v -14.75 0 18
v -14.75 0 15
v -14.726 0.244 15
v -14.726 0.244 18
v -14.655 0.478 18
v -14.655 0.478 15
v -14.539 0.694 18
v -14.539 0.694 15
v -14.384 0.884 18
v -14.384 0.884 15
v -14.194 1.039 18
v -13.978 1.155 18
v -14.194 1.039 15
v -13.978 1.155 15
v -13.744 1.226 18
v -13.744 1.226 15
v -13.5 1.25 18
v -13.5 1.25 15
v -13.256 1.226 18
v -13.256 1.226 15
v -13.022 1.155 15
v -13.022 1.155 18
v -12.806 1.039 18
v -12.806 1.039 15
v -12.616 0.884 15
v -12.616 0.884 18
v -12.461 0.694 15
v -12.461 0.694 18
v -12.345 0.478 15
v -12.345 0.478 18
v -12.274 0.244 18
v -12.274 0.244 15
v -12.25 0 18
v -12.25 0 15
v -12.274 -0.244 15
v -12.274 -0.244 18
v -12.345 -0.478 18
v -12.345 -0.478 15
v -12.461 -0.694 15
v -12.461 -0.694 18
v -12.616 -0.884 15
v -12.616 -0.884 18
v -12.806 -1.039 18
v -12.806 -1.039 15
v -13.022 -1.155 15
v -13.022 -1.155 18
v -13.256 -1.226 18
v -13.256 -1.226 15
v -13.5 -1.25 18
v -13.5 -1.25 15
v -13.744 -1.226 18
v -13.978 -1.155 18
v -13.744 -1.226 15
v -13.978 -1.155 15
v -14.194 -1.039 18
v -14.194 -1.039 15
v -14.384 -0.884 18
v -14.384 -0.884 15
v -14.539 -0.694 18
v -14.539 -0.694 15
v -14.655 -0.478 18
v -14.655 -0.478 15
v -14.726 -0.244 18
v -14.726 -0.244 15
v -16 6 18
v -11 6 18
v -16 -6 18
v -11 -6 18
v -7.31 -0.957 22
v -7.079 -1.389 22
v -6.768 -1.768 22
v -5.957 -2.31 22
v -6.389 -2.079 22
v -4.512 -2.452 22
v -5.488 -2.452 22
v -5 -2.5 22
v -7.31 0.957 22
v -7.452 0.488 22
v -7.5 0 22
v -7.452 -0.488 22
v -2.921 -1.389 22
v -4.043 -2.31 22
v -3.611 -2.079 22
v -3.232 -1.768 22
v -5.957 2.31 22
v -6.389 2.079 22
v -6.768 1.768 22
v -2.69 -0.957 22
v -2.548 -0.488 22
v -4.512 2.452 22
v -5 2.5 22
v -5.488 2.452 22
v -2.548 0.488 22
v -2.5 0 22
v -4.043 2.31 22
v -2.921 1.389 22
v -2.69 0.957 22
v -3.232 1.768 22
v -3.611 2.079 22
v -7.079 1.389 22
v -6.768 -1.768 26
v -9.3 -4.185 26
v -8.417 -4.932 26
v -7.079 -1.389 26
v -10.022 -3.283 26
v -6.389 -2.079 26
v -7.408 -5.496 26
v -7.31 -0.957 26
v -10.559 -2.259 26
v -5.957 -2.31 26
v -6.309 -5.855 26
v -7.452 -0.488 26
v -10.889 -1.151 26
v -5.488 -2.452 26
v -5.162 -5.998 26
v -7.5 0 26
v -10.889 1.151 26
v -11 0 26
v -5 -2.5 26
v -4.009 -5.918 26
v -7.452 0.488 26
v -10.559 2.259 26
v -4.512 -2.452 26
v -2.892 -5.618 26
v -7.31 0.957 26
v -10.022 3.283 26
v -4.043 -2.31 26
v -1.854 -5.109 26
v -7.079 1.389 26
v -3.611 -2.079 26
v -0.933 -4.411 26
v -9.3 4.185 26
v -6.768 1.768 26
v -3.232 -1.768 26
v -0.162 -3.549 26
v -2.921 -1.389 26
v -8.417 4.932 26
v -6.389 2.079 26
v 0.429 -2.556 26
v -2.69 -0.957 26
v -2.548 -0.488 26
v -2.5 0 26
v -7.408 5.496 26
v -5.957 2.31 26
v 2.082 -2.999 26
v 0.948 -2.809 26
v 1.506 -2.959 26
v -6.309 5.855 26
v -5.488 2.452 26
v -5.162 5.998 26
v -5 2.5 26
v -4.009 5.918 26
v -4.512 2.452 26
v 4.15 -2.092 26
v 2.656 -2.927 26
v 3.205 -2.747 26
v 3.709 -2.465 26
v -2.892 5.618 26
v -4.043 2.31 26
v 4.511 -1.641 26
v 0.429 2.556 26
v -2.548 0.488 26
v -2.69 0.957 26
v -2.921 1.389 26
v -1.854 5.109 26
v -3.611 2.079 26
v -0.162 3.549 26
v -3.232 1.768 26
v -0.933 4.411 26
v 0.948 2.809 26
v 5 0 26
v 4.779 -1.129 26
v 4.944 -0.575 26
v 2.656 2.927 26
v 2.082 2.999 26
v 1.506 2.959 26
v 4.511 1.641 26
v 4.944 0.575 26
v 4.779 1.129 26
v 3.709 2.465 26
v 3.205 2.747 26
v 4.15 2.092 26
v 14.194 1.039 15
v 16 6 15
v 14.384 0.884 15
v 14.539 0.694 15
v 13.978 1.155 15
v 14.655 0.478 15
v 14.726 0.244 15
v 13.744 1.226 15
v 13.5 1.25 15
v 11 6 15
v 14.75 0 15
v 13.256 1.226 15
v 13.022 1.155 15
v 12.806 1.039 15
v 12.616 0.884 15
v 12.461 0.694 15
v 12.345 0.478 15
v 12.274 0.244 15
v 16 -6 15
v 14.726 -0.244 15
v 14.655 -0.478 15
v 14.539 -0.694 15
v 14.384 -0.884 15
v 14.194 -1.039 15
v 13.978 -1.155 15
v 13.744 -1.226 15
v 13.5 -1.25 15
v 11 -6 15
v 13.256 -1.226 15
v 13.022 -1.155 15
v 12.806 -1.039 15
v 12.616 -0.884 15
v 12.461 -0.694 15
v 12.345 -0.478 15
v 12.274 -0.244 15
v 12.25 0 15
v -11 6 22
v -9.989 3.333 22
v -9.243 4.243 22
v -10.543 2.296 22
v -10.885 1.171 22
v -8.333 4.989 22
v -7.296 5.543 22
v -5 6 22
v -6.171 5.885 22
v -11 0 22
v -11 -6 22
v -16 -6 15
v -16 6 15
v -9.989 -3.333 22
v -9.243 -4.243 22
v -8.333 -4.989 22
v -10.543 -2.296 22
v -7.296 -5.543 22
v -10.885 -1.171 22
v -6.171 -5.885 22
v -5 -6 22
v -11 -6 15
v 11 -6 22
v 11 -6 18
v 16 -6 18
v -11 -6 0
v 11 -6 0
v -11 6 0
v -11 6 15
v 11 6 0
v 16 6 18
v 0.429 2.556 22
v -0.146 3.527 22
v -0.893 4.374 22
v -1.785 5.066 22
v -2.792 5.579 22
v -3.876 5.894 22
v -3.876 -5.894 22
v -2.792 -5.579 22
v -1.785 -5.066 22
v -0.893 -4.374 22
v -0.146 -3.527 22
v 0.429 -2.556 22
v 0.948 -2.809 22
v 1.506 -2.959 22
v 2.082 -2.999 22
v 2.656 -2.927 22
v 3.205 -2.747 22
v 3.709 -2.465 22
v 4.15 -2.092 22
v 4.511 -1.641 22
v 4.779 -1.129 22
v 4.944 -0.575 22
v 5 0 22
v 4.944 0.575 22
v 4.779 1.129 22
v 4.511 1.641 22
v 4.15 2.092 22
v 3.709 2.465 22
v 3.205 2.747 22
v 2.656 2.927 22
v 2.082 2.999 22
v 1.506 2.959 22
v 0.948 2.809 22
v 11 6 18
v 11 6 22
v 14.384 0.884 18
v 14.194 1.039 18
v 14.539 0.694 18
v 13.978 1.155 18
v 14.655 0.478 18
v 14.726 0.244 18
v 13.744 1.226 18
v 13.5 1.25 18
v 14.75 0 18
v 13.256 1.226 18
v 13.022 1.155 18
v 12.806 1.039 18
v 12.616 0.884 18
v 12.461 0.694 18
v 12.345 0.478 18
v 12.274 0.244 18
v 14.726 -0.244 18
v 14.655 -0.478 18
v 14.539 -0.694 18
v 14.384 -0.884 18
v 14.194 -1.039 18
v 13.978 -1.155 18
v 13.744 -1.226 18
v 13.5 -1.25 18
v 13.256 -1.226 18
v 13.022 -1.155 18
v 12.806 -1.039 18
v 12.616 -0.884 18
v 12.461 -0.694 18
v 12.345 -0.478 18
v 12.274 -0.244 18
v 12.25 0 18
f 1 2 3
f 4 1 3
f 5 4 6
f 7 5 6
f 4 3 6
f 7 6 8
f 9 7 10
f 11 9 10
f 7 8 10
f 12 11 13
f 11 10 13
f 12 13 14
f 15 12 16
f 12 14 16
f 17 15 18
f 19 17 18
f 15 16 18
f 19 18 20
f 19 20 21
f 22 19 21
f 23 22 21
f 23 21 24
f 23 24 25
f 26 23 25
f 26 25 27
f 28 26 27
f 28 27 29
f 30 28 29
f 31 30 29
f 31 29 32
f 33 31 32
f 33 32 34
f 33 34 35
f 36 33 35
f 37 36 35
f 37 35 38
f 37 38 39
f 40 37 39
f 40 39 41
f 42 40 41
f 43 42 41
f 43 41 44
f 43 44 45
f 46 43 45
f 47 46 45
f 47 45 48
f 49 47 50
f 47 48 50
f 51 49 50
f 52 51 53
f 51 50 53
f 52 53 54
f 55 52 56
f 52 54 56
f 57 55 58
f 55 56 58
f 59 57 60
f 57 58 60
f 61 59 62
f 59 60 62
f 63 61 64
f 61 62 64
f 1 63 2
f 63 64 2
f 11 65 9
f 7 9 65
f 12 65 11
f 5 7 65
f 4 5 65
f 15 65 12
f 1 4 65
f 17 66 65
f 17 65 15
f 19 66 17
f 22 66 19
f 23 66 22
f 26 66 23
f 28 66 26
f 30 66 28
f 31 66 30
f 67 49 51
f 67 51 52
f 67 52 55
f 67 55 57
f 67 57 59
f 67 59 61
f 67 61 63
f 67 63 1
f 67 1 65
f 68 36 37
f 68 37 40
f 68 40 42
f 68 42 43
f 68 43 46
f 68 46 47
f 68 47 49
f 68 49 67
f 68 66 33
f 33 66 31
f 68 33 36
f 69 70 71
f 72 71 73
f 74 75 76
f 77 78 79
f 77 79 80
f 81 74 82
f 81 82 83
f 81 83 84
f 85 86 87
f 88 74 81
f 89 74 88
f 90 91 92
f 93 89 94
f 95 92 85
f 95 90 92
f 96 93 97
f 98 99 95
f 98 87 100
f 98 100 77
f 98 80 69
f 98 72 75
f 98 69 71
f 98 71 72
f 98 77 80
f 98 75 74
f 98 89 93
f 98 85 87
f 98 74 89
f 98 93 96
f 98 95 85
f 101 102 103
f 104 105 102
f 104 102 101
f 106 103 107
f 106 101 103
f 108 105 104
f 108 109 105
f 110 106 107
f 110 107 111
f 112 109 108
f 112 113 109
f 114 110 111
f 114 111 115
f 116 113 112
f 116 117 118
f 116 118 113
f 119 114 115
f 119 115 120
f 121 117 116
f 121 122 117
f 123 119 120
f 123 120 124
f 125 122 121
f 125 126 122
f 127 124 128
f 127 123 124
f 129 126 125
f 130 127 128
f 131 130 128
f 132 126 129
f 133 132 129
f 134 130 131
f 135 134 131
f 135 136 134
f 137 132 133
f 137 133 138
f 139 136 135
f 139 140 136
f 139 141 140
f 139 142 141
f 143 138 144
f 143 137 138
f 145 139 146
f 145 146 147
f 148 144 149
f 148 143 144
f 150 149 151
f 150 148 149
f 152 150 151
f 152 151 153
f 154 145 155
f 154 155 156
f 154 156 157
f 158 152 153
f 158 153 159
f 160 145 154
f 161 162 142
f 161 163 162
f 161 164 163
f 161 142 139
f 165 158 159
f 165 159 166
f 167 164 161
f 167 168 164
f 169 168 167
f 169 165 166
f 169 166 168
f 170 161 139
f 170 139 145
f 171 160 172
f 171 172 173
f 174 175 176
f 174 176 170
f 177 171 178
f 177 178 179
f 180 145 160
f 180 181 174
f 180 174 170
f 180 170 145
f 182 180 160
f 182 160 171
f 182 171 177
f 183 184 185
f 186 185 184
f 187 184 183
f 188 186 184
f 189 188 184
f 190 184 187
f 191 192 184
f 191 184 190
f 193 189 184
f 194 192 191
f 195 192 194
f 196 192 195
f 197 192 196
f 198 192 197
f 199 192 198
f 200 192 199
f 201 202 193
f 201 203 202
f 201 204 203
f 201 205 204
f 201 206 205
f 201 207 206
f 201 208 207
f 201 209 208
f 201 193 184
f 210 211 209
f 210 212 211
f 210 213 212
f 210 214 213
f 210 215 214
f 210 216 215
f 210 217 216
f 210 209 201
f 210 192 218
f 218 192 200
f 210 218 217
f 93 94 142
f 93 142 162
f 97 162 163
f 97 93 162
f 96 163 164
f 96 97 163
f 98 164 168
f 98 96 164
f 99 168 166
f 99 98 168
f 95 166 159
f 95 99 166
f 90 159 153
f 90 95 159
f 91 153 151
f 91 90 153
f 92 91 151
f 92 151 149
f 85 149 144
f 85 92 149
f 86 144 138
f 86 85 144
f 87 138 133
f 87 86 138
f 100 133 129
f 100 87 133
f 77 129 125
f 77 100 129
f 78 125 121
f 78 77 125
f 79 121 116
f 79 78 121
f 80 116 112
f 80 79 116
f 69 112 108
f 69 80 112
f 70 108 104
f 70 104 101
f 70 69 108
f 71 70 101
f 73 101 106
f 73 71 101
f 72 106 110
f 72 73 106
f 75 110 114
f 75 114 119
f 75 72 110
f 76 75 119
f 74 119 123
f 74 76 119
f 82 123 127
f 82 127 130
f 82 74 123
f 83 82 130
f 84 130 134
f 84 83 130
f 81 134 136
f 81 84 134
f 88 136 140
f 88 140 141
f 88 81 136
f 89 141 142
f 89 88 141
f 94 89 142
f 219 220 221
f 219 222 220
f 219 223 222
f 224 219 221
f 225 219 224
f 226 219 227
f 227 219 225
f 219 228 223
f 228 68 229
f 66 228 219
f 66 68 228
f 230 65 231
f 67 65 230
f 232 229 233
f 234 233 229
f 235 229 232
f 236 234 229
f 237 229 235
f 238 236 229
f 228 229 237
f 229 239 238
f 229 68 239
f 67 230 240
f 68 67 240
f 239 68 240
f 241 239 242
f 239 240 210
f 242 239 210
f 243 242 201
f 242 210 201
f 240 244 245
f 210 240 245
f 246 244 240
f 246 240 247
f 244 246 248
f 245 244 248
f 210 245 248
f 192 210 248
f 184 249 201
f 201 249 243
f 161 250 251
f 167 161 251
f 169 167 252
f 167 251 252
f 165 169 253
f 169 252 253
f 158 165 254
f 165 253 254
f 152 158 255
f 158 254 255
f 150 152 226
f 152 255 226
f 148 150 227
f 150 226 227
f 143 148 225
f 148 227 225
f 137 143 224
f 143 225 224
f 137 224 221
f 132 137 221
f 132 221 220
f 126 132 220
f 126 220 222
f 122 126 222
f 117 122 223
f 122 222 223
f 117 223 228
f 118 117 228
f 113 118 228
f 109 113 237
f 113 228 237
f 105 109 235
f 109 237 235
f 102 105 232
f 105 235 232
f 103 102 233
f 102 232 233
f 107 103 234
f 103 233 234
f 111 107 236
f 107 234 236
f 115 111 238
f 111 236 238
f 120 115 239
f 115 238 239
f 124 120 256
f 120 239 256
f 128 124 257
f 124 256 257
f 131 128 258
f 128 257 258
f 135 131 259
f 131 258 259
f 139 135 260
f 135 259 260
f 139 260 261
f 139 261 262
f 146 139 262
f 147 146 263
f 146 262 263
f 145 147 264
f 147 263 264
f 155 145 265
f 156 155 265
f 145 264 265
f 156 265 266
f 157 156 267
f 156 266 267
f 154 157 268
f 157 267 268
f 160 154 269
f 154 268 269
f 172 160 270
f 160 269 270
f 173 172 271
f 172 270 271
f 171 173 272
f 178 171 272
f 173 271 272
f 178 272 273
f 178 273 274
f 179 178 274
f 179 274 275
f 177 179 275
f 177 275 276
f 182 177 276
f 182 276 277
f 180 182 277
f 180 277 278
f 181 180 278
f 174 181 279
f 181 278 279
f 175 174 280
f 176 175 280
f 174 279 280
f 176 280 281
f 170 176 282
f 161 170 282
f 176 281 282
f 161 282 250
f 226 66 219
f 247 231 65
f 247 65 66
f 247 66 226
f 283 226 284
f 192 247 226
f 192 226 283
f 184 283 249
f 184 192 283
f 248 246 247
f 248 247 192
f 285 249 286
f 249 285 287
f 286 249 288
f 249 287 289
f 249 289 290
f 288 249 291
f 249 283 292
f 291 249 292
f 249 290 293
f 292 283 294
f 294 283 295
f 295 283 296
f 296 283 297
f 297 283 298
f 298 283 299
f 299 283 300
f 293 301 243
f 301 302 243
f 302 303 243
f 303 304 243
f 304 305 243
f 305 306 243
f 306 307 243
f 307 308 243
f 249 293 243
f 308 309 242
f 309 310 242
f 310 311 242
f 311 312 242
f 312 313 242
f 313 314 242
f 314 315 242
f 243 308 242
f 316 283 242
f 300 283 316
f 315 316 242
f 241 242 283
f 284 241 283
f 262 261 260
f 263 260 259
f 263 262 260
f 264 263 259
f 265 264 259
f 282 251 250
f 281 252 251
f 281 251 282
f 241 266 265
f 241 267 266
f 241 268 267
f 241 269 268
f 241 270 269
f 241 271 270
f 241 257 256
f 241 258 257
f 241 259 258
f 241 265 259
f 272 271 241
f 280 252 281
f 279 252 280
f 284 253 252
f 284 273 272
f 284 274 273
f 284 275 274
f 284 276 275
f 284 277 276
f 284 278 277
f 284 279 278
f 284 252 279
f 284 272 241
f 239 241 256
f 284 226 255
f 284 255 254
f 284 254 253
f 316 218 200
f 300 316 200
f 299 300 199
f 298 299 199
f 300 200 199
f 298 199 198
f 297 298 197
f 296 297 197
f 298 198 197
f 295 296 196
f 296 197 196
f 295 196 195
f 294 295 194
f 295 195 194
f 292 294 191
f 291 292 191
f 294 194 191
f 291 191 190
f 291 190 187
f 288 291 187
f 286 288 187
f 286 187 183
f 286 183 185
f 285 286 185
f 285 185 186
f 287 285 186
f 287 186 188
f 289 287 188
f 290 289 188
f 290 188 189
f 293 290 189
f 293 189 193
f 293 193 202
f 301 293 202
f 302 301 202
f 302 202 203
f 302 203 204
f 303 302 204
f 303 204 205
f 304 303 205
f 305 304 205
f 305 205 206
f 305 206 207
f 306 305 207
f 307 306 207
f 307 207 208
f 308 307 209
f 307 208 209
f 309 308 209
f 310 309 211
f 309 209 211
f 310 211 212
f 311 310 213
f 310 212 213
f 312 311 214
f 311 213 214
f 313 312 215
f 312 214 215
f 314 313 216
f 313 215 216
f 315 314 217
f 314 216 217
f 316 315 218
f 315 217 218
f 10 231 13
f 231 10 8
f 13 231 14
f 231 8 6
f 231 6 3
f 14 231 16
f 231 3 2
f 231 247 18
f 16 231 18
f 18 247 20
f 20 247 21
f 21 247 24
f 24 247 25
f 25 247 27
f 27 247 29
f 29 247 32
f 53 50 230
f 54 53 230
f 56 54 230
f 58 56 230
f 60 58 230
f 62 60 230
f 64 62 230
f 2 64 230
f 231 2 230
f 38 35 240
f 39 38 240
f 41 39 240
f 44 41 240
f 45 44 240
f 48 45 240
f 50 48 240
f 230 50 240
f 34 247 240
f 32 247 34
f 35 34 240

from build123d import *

# Parameters (mm, degrees)
F0_W          = 22
F0_H          = 12
F1_DEPTH      = 22
F2_R          = 2.5
F3_DEPTH      = 4
F4_W          = 12
F4_H          = 3
F5_DEPTH      = 5
F5_DEPTH_BACK = 27
F8_D          = 2.5


with BuildPart() as f1:
    # F0 (on Top) → F1 (new body)
    with BuildSketch(Plane.XY):
        Rectangle(F0_W, F0_H)
    extrude(amount=F1_DEPTH)

    # F2 (on face) → F3 (join)
    with BuildSketch(Plane.XY.offset(22)):
        with BuildLine():
            ThreePointArc((0.428571, -2.555506), (5, 0), (0.428571, 2.555506))
            ThreePointArc((0.428571, 2.555506), (-11, 0), (0.428571, -2.555506))
        make_face()
        with Locations((-5, 0)):
            Circle(F2_R, mode=Mode.SUBTRACT)
    extrude(amount=F3_DEPTH)

    # F4 (on face) → F5 (join, two sides)
    with BuildSketch(Plane(origin=(-11, 0, 0), x_dir=(0, -1, 0), z_dir=(-1, 0, 0))) as f5_sk:
        with Locations((0, 16.5)):
            Rectangle(F4_W, F4_H)
    extrude(amount=F5_DEPTH)
    extrude(f5_sk.sketch, amount=-F5_DEPTH_BACK)

    # F8 (through all)
    with Locations(Plane.XY.offset(18)):
        with Locations((13.5, 0), (-13.5, 0)):
            Hole(F8_D / 2)


solid = f1.part
